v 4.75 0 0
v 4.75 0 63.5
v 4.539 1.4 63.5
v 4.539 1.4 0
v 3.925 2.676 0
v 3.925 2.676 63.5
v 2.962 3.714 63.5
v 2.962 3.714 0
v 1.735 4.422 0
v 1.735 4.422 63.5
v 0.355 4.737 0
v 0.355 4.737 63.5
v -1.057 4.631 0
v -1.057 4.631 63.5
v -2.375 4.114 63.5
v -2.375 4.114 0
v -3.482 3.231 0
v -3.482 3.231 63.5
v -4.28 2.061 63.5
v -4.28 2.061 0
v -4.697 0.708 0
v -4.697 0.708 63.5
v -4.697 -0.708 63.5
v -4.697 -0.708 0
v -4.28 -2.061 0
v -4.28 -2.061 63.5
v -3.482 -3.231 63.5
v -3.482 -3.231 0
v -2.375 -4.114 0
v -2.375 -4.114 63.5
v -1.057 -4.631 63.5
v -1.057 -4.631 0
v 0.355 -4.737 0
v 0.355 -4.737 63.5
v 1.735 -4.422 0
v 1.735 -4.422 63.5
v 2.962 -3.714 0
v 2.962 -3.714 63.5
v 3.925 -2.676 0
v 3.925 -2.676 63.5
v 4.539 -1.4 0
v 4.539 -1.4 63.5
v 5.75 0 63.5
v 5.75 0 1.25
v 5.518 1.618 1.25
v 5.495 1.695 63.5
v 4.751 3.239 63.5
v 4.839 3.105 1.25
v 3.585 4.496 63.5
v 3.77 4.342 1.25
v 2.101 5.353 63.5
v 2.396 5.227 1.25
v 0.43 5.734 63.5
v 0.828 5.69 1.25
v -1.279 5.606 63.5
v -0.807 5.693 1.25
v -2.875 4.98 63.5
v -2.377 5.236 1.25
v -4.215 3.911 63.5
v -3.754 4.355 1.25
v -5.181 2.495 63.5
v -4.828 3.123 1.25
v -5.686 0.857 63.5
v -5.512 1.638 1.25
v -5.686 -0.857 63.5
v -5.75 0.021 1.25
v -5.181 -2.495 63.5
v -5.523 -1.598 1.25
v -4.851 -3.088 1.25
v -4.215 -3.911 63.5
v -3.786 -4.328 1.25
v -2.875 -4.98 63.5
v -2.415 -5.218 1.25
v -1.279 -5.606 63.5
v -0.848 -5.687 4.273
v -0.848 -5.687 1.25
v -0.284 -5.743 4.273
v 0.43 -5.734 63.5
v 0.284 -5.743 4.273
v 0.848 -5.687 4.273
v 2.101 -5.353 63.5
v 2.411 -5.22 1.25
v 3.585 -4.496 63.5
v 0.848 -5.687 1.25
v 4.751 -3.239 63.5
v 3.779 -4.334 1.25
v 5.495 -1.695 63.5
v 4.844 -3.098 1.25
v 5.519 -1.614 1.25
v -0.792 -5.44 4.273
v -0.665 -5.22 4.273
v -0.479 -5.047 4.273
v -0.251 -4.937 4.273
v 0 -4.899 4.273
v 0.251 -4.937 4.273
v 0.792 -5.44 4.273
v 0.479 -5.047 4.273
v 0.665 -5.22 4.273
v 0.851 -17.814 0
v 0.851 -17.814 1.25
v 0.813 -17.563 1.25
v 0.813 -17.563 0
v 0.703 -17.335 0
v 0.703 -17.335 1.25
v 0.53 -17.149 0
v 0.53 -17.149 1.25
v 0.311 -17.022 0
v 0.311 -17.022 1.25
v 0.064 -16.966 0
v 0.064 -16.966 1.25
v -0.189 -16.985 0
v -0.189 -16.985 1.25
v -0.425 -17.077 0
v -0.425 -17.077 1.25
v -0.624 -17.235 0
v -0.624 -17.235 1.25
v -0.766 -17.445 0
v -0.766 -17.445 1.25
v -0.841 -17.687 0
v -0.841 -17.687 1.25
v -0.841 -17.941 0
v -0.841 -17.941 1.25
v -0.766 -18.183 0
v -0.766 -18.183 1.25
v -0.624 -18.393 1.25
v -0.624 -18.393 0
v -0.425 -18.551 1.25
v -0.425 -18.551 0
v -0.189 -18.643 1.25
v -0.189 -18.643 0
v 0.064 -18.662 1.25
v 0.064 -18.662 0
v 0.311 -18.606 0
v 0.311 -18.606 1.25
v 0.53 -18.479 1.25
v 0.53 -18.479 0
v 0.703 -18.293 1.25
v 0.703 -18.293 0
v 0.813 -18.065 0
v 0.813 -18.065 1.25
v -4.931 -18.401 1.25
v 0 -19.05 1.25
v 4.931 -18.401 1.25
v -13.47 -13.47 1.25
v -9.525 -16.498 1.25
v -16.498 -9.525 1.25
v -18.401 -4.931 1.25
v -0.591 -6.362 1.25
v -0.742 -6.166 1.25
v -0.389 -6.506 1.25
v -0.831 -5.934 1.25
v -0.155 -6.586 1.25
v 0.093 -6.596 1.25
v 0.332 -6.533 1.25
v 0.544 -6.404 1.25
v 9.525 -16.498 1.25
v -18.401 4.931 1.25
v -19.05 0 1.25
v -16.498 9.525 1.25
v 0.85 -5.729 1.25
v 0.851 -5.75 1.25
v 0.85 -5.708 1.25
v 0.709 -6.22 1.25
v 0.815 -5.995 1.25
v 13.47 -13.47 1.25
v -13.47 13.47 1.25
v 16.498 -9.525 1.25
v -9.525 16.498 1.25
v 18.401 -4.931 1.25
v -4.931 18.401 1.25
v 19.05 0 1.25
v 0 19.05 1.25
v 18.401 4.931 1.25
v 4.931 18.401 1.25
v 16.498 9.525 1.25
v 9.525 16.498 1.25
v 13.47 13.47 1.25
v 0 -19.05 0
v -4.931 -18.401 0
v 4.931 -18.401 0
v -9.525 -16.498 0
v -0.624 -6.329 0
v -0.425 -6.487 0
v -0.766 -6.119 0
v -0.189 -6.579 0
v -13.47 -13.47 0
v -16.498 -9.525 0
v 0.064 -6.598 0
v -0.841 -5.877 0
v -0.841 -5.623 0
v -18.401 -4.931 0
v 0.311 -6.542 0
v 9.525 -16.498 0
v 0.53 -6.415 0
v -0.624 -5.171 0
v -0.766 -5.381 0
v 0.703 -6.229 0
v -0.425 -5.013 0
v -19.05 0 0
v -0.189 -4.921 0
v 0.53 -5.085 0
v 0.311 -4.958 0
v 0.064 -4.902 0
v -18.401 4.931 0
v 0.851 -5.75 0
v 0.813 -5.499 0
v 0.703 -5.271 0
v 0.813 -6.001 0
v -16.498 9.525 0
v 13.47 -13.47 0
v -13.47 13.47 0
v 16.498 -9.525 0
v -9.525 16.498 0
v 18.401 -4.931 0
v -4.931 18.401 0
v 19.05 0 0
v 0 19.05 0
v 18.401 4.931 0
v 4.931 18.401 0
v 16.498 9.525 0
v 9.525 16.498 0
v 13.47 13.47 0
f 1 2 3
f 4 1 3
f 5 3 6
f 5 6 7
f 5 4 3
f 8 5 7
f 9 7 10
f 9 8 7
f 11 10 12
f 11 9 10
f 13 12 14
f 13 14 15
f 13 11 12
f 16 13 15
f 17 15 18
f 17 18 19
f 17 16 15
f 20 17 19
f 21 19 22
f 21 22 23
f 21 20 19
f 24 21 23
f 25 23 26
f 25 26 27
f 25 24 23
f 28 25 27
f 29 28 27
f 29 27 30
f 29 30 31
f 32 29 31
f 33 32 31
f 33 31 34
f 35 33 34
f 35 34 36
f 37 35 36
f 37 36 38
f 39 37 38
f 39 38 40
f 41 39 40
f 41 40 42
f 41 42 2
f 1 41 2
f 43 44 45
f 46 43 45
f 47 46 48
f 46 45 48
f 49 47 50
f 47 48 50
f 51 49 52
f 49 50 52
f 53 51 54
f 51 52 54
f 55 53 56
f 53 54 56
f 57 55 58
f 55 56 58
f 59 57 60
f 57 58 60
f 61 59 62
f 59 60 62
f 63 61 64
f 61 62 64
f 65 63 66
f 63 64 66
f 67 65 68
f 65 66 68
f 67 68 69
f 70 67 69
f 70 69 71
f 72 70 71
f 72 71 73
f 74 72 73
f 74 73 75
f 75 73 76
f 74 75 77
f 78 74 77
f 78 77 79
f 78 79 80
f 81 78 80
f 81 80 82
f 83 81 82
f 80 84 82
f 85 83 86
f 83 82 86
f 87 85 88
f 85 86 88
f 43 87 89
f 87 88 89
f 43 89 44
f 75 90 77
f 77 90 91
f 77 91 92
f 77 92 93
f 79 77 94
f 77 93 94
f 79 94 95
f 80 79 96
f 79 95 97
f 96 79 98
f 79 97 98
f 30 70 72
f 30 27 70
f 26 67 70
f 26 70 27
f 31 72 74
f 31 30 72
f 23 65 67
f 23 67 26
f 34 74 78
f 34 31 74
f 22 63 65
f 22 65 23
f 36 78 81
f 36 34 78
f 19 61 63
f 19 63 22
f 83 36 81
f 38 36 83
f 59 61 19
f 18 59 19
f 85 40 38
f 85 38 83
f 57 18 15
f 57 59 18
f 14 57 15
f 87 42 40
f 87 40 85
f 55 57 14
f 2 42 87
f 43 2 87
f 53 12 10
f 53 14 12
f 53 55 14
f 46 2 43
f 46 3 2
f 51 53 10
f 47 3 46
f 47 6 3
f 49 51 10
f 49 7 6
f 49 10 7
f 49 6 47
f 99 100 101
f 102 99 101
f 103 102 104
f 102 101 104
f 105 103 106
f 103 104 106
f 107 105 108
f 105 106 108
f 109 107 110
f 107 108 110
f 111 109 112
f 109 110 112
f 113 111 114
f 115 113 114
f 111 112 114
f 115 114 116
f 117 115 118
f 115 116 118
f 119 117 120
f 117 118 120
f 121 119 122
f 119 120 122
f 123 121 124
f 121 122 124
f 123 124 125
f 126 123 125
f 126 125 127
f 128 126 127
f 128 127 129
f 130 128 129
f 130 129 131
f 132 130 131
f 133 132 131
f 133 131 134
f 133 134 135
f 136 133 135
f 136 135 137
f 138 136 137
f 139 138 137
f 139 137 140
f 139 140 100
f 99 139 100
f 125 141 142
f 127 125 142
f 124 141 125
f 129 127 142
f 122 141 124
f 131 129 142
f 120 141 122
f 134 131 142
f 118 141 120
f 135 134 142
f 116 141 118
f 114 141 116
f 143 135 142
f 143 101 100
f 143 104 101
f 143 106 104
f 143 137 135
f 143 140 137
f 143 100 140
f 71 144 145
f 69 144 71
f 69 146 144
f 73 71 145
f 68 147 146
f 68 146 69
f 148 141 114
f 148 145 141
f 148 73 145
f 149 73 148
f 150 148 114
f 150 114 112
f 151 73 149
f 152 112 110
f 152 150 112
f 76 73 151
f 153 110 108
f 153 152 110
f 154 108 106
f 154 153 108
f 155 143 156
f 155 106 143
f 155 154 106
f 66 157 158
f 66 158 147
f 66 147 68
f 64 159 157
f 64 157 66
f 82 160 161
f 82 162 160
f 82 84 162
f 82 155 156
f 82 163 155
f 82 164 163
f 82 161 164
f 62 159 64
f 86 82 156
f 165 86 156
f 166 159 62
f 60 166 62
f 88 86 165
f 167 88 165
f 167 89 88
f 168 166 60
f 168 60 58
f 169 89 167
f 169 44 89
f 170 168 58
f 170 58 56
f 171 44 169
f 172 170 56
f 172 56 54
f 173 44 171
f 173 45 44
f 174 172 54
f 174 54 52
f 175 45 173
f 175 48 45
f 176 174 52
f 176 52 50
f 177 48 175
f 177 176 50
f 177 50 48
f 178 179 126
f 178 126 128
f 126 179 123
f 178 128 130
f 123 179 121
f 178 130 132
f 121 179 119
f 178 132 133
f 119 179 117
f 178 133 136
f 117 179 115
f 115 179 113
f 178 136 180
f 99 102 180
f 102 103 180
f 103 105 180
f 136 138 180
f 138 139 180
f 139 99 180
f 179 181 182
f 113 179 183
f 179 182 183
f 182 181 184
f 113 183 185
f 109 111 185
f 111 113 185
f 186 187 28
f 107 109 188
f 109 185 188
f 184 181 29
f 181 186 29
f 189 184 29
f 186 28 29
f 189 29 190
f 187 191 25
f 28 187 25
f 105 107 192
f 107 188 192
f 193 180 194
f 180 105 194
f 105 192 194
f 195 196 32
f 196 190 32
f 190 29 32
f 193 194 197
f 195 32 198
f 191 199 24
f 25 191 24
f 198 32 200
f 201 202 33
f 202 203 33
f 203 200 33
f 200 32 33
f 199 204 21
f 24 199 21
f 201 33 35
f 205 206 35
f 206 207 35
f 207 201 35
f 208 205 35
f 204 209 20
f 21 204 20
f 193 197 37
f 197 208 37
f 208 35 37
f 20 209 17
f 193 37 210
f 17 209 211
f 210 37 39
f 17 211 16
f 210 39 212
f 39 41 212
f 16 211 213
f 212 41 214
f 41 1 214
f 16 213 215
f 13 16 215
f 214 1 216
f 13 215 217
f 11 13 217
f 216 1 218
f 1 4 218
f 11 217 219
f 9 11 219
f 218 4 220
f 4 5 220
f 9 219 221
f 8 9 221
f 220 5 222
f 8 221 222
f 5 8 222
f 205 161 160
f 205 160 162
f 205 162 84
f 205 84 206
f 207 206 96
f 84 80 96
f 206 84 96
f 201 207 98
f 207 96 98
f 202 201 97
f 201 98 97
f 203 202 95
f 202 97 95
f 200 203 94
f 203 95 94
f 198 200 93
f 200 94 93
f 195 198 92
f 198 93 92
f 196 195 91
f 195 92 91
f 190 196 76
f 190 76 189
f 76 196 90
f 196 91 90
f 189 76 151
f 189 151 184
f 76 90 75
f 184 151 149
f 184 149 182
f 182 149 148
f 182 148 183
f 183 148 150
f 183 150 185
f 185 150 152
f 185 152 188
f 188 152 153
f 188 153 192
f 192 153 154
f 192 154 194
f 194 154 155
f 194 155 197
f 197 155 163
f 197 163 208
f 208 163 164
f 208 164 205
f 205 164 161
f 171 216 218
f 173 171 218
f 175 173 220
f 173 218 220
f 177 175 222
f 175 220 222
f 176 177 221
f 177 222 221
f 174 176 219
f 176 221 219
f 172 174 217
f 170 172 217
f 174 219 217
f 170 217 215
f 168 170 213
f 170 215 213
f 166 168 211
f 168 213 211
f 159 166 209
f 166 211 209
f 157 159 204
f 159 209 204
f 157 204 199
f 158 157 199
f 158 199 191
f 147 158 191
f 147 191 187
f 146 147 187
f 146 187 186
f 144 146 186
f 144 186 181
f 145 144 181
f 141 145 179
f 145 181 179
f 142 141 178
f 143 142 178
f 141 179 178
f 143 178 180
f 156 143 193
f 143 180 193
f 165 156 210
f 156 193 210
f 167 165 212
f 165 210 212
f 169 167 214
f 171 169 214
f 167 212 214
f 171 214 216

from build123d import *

# Parameters (mm, degrees)
F0_R          = 19.05
F0_R_2        = 5.75
F0_R_3        = 4.75
F1_DEPTH      = 1.25
F2_DEPTH      = 63.5
F3_R          = 0.8507078104
F4_DEPTH      = 25.4
F4_DEPTH_BACK = 3.0226


with BuildPart() as f1:
    # F0 (on Top) → F1 (new body)
    with BuildSketch(Plane.XY):
        Circle(F0_R)
        Circle(F0_R_2, mode=Mode.SUBTRACT)
        Circle(F0_R_2)
        Circle(F0_R_3, mode=Mode.SUBTRACT)
    extrude(amount=F1_DEPTH)

    # F0 (on Top) → F2 (join)
    with BuildSketch(Plane.XY):
        Circle(F0_R_2)
        Circle(F0_R_3, mode=Mode.SUBTRACT)
    extrude(amount=F2_DEPTH)

    # F3 (on face) → F4 (cut, two sides)
    with BuildSketch(Plane.XY.offset(1.25)) as f4_sk:
        with Locations((0, -5.75)):
            Circle(F3_R)
        with Locations((0, -17.8138911724)):
            Circle(F3_R)
    extrude(amount=-F4_DEPTH, mode=Mode.SUBTRACT)
    extrude(f4_sk.sketch, amount=F4_DEPTH_BACK, mode=Mode.SUBTRACT)


solid = f1.part
